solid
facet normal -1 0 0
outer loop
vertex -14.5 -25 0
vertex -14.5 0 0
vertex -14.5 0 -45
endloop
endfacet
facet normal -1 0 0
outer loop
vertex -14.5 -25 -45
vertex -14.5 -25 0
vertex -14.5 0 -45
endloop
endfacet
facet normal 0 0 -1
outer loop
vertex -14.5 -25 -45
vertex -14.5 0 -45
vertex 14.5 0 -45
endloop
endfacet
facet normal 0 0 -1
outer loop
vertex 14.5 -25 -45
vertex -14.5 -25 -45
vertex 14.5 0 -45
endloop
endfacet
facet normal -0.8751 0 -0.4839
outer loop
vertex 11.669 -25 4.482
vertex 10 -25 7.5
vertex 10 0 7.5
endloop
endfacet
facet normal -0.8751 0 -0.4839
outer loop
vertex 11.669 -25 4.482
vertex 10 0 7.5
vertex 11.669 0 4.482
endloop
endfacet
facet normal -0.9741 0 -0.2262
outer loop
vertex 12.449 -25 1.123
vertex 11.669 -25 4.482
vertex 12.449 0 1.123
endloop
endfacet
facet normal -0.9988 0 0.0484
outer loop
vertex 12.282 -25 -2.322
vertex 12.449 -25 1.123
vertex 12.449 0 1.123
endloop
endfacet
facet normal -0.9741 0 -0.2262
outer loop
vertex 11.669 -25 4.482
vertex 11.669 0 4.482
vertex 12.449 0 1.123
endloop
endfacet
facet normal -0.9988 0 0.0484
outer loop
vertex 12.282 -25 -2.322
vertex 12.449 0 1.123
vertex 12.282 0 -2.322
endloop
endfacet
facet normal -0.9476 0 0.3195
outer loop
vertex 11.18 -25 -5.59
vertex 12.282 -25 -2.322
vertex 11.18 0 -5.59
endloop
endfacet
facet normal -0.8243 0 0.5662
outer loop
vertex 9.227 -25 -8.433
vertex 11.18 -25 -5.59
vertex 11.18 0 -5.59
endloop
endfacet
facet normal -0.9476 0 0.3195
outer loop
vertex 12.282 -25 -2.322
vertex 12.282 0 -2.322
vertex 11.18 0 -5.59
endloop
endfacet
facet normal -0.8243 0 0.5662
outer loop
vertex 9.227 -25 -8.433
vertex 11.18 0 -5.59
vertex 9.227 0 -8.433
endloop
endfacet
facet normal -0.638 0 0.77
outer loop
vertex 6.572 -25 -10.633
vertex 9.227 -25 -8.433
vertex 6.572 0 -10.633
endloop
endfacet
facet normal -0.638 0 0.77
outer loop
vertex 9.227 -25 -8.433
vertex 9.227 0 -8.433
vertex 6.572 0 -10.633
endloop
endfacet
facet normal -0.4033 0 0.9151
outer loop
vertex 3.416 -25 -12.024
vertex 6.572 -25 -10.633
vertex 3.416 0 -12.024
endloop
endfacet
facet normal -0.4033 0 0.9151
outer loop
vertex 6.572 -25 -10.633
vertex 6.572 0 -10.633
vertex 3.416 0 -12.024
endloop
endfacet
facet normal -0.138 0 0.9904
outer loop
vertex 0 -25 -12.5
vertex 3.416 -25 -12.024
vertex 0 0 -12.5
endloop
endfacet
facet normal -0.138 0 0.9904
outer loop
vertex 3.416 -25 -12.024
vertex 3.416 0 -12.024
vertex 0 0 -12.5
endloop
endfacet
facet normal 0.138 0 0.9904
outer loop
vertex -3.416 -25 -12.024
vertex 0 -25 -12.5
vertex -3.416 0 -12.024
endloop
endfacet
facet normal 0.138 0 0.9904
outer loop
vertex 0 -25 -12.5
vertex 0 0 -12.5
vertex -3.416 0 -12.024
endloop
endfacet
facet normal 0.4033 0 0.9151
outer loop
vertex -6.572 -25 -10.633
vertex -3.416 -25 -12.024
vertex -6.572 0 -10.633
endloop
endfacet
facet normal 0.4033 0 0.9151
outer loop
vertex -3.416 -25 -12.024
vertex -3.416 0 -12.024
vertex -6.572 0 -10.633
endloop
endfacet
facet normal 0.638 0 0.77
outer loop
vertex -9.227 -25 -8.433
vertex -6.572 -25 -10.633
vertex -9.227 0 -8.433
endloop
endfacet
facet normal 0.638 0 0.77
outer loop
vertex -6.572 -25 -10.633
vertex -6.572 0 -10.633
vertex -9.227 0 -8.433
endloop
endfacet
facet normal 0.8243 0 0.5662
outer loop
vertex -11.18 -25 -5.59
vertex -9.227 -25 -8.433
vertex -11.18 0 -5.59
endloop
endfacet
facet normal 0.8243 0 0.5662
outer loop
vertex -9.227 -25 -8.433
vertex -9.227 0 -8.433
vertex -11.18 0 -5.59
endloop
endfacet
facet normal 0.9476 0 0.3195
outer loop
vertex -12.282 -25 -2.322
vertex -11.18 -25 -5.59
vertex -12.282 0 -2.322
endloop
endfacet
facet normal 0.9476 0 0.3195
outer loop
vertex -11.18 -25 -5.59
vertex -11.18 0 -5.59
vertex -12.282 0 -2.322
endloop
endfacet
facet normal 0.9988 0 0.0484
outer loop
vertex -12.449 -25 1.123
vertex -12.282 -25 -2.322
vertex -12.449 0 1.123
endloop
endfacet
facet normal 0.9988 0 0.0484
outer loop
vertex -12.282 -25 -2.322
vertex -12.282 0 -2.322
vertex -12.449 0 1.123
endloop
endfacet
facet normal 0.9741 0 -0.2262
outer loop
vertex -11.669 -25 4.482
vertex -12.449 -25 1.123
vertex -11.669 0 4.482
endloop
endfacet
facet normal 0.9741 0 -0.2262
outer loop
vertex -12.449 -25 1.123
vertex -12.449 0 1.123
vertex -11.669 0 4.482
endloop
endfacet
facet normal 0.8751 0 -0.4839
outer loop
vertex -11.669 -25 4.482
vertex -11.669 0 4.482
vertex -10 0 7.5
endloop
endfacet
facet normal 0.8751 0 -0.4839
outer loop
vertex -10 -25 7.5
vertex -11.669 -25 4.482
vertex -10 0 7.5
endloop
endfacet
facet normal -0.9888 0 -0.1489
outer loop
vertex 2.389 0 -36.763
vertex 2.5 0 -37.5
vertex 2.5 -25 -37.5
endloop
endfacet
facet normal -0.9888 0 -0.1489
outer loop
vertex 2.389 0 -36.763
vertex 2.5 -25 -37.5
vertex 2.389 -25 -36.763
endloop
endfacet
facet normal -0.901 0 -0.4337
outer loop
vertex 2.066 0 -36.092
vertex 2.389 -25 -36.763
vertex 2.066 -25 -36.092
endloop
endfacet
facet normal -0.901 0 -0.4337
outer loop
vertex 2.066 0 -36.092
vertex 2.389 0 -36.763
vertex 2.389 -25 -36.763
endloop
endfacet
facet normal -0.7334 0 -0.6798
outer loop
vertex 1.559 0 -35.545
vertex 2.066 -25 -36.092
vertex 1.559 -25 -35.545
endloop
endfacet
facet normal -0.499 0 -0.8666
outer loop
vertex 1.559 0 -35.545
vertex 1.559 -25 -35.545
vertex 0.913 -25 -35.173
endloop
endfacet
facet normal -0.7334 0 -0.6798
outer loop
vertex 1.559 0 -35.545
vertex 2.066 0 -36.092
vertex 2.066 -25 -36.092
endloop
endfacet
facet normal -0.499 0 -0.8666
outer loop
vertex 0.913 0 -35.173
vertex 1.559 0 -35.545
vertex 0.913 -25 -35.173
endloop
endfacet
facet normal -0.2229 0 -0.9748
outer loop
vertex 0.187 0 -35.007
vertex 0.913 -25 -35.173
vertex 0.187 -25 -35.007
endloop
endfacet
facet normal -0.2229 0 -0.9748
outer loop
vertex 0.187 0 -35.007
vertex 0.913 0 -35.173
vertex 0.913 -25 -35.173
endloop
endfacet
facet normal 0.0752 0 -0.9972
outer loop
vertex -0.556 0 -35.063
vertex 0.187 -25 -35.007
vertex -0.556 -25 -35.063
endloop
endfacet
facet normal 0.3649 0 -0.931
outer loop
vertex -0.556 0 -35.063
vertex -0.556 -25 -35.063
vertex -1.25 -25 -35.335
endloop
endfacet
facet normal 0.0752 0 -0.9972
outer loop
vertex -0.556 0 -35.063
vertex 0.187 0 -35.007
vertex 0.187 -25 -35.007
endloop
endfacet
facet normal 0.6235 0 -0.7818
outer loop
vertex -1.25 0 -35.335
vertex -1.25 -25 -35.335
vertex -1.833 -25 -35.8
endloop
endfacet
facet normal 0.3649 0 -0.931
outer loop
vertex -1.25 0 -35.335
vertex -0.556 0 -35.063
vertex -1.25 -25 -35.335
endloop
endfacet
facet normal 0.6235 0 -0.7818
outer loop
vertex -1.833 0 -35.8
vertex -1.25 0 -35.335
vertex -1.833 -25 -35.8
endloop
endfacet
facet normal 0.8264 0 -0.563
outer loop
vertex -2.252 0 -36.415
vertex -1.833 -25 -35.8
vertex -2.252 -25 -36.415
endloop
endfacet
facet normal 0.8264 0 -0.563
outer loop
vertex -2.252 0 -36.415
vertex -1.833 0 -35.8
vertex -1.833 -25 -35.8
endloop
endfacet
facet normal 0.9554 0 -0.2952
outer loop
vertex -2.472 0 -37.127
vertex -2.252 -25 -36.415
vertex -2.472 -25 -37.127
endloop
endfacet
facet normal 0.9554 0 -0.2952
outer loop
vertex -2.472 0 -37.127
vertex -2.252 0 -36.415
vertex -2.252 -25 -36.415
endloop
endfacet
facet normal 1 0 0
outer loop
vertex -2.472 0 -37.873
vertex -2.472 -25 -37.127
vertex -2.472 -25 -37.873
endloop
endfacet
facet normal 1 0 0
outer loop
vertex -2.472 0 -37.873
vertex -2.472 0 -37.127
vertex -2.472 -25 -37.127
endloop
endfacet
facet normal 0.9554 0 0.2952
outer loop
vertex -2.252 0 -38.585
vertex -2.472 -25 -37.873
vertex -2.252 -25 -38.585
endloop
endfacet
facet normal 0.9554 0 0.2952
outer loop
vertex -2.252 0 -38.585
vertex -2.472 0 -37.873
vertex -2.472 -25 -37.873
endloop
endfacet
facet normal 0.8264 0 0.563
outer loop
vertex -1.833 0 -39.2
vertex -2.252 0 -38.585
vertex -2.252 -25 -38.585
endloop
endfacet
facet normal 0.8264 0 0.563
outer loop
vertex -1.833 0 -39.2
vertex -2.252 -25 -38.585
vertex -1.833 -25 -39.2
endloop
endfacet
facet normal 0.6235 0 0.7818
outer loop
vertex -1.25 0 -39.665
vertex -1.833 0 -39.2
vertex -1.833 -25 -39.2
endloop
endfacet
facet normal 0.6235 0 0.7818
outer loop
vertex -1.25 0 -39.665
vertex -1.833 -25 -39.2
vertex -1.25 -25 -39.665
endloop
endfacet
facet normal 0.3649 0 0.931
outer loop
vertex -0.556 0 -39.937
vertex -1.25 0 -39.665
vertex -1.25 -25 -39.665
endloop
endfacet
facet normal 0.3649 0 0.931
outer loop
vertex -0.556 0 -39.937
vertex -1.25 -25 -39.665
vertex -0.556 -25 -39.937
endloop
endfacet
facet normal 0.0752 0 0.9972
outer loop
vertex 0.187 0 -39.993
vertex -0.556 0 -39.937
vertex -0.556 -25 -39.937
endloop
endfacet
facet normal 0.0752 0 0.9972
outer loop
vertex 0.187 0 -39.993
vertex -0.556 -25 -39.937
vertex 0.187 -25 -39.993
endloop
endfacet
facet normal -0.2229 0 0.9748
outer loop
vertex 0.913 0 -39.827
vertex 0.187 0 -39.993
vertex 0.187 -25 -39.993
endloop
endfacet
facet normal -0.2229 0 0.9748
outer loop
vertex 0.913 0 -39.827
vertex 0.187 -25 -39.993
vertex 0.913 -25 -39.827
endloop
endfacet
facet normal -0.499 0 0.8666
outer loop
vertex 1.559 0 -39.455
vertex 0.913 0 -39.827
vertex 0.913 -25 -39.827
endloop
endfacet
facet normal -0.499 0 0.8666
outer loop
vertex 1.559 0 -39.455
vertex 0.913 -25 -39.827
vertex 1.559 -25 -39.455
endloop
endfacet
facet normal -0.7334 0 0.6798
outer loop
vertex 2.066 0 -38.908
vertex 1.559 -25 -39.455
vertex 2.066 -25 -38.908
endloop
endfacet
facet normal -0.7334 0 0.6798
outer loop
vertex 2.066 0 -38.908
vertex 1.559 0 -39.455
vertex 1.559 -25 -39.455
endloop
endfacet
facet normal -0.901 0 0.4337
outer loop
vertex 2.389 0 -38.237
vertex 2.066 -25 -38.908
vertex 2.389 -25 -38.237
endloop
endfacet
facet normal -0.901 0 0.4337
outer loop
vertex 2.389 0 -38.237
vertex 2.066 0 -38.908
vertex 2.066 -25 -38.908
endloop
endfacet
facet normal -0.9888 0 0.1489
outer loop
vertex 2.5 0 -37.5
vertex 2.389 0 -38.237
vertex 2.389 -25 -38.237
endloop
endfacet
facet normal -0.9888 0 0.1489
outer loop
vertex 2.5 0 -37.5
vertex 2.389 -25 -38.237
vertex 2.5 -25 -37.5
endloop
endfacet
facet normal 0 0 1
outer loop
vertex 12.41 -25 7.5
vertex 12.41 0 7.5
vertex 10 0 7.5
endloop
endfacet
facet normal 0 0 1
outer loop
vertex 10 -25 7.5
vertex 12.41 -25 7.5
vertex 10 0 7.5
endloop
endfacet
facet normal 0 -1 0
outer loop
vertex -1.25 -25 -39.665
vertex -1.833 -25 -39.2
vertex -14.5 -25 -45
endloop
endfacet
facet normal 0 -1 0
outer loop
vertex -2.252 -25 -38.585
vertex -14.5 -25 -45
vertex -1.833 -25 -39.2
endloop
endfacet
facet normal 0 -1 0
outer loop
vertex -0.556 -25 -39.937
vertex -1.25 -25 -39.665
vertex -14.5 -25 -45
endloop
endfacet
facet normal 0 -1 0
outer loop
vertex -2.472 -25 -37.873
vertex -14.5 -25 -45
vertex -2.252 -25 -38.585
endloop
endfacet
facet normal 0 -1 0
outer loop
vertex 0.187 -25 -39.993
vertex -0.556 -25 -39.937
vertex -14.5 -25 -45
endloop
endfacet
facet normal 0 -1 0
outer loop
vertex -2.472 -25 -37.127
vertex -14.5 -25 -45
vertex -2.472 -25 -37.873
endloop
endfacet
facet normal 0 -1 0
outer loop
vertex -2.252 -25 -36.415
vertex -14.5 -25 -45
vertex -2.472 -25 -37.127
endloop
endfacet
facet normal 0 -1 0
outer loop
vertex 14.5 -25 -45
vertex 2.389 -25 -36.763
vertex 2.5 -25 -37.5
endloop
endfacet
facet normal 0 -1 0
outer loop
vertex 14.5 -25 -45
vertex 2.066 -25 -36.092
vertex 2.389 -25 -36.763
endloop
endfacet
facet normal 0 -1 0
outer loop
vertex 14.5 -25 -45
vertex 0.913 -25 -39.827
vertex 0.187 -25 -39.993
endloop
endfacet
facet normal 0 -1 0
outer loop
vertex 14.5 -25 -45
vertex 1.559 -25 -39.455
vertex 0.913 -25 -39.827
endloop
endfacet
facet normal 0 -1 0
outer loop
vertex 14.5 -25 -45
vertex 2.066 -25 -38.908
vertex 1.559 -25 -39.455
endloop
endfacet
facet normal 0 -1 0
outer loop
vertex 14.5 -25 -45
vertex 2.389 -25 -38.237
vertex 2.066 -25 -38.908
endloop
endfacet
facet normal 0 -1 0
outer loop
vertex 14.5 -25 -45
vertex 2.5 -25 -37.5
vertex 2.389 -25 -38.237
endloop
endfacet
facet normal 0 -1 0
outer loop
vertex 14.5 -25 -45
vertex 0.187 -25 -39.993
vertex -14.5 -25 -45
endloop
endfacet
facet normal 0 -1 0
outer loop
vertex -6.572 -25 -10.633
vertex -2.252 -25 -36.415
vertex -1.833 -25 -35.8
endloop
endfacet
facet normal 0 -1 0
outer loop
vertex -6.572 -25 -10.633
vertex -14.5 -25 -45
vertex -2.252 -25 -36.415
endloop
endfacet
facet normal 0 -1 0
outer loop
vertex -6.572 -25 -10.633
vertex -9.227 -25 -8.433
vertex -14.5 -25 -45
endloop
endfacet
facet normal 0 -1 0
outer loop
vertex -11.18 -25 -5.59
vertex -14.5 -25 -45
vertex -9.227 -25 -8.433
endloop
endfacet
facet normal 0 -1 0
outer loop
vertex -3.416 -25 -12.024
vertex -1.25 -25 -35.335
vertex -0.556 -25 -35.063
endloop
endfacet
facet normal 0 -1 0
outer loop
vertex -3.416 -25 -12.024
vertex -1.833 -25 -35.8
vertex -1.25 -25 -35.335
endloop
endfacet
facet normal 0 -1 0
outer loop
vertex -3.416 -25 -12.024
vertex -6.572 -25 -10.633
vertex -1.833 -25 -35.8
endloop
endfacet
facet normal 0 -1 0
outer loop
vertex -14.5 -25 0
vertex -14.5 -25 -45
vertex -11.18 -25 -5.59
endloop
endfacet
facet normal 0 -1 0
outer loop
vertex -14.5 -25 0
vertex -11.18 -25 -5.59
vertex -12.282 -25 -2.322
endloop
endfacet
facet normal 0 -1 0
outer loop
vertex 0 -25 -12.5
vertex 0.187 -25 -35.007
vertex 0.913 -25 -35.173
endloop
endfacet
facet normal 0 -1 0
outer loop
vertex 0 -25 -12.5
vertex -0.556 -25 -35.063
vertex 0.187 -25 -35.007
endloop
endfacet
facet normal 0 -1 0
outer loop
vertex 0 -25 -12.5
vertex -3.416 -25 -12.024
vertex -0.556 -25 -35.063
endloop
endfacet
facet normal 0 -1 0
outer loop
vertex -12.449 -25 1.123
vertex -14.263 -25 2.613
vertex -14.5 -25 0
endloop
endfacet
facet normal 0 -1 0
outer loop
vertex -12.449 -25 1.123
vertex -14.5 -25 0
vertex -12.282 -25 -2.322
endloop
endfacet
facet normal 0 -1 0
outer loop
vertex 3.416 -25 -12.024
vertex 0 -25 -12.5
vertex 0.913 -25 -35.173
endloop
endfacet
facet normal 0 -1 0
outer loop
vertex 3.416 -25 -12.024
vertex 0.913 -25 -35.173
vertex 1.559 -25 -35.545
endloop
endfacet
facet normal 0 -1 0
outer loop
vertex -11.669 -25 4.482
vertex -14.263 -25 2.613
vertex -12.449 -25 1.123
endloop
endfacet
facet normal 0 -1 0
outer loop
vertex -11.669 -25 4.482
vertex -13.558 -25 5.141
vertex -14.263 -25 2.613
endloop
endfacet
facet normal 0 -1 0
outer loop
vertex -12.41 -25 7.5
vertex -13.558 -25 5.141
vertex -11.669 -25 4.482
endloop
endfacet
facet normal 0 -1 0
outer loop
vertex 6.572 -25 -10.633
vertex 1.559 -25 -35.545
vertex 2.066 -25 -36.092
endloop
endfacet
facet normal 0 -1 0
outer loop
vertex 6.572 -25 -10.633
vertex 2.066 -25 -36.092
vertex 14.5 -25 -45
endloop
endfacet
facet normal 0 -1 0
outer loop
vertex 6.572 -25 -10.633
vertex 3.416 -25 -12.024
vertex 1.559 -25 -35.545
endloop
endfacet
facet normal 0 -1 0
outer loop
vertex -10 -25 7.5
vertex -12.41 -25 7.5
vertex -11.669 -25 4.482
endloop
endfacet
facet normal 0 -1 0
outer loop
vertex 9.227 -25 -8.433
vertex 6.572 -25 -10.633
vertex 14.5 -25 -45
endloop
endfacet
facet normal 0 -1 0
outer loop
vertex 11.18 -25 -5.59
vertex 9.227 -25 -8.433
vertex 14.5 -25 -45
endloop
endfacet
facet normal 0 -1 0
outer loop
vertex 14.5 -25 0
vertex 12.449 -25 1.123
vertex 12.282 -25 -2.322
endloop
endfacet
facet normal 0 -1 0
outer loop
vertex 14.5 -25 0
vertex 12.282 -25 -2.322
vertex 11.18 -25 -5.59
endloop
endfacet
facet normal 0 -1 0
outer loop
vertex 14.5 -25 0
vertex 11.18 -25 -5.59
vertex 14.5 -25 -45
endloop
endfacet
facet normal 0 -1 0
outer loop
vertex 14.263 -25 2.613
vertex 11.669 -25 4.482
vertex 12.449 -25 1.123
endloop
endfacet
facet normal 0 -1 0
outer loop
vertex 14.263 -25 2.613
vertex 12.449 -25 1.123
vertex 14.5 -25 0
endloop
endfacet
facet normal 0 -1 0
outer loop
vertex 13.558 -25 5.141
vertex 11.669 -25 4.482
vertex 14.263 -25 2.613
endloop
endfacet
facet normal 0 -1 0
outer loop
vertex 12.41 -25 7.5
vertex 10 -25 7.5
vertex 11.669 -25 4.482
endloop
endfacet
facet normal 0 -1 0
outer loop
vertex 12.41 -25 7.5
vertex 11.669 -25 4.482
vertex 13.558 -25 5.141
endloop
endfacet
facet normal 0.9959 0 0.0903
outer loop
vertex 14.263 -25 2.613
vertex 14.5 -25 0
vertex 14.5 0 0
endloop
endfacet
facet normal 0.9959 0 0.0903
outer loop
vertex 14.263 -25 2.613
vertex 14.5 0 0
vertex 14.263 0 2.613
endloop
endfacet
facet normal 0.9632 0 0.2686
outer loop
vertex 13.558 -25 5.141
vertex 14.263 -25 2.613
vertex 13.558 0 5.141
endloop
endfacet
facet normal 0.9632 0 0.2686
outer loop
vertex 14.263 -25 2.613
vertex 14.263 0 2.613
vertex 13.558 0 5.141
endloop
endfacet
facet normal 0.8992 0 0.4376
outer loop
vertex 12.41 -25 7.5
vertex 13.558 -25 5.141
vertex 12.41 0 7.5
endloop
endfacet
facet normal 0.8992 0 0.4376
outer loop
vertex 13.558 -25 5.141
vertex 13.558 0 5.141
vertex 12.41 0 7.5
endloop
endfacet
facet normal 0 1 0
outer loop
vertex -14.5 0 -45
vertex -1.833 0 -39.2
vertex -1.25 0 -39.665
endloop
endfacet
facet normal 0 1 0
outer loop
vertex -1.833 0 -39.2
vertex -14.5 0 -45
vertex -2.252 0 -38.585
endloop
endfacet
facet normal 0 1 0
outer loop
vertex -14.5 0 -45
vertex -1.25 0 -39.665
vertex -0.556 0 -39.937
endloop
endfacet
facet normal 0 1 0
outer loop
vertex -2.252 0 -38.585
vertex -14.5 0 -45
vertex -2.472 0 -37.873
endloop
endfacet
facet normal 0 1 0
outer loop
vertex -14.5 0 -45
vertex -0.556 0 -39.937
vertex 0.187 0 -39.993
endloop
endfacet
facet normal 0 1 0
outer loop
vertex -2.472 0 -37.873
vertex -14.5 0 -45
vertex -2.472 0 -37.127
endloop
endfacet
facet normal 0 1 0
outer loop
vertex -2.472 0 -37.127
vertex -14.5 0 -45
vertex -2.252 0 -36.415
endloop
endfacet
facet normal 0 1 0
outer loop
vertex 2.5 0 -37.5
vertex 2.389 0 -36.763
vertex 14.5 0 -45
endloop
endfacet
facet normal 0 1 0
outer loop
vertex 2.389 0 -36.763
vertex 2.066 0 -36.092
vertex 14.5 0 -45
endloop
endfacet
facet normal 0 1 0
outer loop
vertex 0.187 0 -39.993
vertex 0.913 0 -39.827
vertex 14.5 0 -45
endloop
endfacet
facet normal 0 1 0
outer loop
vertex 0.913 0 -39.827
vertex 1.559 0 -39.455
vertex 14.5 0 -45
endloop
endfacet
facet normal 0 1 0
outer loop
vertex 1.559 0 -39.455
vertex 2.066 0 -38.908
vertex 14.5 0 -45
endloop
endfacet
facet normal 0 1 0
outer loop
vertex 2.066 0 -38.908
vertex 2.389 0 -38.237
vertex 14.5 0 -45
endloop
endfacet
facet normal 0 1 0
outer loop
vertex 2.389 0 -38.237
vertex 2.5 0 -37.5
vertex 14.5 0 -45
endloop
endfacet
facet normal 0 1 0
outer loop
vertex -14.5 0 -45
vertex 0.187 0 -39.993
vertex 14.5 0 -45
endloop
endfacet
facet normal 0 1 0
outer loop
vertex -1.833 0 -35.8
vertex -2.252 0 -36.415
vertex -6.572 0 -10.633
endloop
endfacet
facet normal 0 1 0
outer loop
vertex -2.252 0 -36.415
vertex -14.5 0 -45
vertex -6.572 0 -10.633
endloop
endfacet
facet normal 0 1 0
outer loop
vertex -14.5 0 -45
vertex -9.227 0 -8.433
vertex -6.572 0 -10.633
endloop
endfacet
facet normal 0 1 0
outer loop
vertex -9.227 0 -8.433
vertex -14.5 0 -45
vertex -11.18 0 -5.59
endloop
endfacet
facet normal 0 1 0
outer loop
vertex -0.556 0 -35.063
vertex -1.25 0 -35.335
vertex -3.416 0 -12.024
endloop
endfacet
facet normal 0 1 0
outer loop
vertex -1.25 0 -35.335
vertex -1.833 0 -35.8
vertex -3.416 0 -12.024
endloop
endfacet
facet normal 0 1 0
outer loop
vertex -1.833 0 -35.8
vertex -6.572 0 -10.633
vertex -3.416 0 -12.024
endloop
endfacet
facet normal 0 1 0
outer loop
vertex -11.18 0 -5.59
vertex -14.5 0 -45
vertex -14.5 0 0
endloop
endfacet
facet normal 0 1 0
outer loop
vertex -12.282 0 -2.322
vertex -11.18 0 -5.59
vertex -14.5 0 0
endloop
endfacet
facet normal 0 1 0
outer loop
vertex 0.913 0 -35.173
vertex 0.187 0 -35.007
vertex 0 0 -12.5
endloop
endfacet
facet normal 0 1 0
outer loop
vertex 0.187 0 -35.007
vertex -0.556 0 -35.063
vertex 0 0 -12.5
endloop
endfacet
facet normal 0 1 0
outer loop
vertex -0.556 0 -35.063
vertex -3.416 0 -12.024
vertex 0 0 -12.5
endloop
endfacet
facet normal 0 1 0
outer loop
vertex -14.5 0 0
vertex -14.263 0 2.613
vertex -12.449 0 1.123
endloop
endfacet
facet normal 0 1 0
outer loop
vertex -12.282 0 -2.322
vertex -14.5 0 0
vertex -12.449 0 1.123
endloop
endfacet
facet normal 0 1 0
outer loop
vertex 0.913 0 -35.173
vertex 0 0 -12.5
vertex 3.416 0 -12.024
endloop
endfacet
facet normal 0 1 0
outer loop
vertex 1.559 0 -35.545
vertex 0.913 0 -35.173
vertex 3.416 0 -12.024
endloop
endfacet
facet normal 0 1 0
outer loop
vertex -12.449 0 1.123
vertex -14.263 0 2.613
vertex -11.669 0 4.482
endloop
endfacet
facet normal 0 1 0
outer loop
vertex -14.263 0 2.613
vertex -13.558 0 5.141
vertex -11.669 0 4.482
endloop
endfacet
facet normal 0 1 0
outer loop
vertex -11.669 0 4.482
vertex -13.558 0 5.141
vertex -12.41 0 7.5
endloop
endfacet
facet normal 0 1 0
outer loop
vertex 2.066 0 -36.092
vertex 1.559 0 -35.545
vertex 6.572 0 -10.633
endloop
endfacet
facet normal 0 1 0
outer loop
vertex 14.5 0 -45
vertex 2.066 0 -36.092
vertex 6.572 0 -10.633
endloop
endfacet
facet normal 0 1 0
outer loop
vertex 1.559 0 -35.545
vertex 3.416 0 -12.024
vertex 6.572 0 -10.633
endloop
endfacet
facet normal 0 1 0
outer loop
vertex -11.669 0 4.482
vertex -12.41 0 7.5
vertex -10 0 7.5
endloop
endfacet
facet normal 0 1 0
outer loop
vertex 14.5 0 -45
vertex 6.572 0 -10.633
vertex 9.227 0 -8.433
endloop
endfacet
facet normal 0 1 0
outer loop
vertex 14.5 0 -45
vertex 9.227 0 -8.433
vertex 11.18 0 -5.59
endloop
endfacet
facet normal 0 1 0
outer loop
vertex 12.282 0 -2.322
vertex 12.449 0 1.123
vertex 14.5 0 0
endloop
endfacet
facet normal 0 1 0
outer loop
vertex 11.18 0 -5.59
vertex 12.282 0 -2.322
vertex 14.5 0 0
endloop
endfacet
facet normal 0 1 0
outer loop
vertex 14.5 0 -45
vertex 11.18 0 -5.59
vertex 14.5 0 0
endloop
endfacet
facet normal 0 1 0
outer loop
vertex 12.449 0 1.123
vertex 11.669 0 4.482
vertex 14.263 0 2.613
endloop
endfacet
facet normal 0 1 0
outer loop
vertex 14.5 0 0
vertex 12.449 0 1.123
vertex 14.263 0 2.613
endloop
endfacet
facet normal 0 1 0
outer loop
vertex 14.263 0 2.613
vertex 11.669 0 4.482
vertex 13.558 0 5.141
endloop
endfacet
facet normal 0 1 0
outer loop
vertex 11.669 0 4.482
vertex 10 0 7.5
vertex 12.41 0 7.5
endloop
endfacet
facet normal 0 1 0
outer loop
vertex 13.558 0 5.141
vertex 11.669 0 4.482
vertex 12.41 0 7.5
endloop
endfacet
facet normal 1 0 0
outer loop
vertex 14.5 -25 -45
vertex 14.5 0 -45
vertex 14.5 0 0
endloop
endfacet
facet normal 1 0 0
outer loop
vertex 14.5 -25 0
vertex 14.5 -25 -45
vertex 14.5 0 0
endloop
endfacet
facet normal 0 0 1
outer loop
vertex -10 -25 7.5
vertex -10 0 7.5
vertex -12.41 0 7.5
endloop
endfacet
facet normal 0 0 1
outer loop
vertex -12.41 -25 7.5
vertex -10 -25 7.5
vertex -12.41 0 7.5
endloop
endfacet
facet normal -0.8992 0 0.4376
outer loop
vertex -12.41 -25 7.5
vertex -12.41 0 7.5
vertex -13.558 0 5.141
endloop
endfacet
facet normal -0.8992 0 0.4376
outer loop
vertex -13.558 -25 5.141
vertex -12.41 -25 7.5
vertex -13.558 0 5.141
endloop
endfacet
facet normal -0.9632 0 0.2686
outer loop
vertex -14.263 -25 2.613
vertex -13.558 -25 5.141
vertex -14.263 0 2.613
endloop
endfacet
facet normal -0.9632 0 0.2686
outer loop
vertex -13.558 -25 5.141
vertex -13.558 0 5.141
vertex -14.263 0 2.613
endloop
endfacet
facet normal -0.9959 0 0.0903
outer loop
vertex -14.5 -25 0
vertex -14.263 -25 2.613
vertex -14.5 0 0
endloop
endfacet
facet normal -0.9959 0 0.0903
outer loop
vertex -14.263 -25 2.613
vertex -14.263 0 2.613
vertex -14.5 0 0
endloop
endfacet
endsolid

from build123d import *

# Parameters (mm, degrees)
F0_R     = 2.5
F1_DEPTH = 25


with BuildPart() as f1:
    # F0 (on Front) → F1 (new body)
    with BuildSketch(Plane.XZ):
        with BuildLine():
            ThreePointArc((10, 7.5), (0, -12.5), (-10, 7.5))
            Line((-10, 7.5), (-12.409674, 7.5))
            ThreePointArc((-12.409674, 7.5), (-13.967646, 3.892925), (-14.5, 0))
            Line((-14.5, 0), (-14.5, -45))
            Line((-14.5, -45), (14.5, -45))
            Line((14.5, -45), (14.5, 0))
            ThreePointArc((14.5, 0), (13.967646, 3.892925), (12.409674, 7.5))
            Line((12.409674, 7.5), (10, 7.5))
        make_face()
        with Locations((0, -37.5)):
            Circle(F0_R, mode=Mode.SUBTRACT)
    extrude(amount=F1_DEPTH)


solid = f1.part
